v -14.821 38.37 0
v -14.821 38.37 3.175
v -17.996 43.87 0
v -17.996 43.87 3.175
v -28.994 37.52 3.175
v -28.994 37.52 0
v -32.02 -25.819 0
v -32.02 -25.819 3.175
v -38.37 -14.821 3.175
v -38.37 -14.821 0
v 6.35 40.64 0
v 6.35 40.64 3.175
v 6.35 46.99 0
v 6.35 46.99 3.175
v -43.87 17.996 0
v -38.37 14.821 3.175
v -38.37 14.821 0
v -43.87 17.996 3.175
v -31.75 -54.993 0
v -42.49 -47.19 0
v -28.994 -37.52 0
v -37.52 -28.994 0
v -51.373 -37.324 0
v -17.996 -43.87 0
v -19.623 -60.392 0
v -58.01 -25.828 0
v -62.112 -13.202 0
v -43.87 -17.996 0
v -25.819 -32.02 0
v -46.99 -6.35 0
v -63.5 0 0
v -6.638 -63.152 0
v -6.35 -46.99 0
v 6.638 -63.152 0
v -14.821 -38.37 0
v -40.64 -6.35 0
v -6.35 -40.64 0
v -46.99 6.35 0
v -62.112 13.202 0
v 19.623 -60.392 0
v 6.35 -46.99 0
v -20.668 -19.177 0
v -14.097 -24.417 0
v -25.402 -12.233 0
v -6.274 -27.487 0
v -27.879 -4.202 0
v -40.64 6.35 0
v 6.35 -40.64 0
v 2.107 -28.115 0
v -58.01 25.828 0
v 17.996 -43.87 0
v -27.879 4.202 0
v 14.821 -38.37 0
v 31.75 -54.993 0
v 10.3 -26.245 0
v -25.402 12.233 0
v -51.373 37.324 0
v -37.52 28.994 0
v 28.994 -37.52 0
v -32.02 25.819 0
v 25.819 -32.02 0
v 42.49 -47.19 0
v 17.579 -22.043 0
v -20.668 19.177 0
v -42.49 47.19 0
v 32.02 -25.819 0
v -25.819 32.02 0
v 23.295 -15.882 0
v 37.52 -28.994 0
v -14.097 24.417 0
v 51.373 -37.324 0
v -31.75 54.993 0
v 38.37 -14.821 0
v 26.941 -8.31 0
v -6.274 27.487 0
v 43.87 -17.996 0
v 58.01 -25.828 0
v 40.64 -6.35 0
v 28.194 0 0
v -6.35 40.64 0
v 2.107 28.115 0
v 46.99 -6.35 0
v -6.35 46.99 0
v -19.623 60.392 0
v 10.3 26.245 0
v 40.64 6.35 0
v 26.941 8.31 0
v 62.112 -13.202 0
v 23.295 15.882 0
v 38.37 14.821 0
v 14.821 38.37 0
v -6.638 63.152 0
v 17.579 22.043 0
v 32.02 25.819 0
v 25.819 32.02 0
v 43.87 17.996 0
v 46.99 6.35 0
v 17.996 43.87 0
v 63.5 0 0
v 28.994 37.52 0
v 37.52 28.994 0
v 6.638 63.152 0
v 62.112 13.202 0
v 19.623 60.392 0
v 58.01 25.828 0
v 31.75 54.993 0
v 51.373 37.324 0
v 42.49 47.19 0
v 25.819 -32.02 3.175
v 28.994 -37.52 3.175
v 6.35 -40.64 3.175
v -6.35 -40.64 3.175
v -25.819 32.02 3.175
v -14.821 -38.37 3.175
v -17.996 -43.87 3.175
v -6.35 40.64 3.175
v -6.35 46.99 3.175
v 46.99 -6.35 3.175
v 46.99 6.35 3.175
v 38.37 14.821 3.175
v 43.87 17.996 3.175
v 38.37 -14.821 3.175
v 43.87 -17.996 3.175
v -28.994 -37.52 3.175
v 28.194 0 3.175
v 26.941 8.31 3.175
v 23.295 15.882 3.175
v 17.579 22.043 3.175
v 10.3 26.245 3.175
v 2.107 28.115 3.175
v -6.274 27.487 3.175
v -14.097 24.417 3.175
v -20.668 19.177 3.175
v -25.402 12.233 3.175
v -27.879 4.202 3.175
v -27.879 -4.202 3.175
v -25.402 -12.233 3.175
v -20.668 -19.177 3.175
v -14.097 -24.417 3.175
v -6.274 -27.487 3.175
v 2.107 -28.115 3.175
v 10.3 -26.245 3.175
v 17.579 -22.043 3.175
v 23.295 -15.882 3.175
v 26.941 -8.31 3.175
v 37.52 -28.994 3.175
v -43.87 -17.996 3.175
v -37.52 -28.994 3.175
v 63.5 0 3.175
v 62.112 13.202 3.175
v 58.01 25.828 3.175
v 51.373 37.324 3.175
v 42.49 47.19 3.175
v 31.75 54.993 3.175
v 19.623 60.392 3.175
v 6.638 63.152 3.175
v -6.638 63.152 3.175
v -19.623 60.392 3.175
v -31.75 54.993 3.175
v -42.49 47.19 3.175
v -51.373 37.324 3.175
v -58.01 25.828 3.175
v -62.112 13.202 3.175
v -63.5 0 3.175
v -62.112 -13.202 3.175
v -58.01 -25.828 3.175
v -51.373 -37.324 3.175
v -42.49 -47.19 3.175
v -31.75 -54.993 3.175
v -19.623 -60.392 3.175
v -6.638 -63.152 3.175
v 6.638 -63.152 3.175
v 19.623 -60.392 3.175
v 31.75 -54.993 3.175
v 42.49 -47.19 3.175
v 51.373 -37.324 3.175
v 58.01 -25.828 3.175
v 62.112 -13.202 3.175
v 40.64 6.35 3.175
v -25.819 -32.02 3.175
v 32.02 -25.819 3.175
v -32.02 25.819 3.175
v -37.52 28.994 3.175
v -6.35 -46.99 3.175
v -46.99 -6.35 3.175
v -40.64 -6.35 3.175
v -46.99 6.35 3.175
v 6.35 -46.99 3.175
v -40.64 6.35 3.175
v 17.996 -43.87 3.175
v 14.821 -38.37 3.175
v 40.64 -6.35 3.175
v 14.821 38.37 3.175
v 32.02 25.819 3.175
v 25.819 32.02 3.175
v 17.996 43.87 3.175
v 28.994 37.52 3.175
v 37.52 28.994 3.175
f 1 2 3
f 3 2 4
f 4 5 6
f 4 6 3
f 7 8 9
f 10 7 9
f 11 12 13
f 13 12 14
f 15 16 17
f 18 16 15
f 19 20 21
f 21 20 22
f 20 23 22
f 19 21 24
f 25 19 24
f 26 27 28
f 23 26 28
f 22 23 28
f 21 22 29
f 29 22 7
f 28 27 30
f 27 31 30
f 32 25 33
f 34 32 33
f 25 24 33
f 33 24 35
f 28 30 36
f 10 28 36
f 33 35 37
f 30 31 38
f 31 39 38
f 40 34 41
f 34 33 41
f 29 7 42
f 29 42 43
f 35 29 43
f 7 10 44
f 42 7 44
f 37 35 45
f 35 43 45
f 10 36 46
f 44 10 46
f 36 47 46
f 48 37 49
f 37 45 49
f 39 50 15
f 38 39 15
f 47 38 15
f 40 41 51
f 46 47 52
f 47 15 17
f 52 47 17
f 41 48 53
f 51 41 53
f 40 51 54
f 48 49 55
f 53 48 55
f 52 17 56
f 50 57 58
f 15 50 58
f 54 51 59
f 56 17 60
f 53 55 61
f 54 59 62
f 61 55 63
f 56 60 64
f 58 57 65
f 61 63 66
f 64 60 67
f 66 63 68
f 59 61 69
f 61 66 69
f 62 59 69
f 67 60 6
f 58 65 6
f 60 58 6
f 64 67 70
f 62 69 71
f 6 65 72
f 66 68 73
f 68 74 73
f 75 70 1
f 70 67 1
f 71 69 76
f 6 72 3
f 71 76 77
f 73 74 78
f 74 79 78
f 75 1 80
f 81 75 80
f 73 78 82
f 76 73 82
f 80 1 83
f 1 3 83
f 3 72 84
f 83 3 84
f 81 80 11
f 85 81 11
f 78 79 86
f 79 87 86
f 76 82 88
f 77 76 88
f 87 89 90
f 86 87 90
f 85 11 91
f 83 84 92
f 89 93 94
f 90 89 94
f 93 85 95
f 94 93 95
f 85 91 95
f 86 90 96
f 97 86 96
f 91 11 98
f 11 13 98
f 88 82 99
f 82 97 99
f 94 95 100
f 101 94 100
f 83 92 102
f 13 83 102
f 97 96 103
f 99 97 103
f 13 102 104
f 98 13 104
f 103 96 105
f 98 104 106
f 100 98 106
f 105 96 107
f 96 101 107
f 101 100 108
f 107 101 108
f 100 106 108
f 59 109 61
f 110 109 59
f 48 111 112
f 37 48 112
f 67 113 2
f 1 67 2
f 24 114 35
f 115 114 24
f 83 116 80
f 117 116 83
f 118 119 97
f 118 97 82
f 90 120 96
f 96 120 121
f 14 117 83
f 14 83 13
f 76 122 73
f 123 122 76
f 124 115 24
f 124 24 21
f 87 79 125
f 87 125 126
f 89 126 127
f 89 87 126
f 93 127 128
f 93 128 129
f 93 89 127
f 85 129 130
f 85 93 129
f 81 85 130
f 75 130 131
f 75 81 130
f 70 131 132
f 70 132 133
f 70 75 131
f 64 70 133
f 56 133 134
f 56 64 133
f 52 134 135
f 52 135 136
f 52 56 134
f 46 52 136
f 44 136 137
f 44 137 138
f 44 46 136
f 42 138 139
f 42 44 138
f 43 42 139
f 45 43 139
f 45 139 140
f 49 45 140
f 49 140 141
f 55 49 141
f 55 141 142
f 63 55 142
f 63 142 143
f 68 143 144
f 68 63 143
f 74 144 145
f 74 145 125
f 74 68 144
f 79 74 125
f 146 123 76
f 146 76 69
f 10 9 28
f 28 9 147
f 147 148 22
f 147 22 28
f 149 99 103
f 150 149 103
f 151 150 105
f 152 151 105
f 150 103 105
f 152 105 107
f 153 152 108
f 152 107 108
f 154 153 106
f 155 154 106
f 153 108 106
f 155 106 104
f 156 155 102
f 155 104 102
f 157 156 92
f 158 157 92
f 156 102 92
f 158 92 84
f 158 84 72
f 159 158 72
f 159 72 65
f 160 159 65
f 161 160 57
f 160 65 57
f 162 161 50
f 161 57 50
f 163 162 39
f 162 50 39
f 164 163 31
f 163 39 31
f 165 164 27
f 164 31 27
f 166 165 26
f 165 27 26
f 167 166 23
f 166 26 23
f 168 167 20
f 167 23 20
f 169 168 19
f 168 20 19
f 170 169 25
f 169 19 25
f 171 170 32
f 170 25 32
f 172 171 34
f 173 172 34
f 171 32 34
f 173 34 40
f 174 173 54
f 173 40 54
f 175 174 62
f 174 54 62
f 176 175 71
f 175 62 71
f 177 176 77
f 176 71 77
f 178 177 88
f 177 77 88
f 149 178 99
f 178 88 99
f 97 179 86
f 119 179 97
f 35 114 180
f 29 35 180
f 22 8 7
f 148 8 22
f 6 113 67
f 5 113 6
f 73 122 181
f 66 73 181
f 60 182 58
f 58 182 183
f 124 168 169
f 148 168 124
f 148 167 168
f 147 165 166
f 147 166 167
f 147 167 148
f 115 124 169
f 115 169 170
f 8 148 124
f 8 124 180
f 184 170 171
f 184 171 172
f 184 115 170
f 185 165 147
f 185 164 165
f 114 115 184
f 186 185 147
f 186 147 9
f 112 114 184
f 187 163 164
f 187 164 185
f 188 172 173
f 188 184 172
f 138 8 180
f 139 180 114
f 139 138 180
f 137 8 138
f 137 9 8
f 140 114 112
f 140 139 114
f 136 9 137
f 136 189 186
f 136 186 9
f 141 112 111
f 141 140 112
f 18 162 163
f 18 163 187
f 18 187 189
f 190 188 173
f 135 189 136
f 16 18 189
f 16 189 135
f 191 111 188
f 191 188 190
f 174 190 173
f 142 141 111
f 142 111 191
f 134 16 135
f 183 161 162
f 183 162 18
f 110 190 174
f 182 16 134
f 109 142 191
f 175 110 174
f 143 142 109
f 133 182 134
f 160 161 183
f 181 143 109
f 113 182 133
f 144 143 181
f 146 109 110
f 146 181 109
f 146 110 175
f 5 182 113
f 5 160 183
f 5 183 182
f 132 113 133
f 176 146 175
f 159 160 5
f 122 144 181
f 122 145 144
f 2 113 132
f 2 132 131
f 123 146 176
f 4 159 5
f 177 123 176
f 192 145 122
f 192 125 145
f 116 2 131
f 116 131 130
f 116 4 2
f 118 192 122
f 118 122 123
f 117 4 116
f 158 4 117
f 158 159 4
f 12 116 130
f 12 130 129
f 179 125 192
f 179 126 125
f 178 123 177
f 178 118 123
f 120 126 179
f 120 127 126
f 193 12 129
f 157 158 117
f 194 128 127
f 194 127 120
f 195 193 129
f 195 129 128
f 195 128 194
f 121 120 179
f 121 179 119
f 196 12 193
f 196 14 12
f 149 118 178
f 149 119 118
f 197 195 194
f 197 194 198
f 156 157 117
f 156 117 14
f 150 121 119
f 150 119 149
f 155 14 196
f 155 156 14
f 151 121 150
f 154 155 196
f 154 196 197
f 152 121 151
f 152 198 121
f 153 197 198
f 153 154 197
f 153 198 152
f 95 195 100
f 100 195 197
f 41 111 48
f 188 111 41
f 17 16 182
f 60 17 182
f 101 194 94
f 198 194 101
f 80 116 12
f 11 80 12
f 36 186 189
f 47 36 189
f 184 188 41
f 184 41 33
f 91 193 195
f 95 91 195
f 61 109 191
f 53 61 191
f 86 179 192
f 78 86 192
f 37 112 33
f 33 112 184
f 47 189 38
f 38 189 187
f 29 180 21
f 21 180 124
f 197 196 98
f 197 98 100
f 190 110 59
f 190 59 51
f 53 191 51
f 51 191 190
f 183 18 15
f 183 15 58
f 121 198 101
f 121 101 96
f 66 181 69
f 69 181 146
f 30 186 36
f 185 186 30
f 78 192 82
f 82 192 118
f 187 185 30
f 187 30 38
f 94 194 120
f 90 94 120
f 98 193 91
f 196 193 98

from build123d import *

# Parameters (mm, degrees)
F0_R            = 63.5
F0_R_2          = 28.194
F1_DEPTH        = 3.175
F2_W            = 12.7
F2_H            = 6.35
F3_DEPTH        = 3.176
F3_COPIES_COUNT = 12


# Not quite as in the source:
# - a pattern or mirror of a feature is missing from the dataset's text; its kind, count and spacing are read off the source's solid


with BuildPart() as f1:
    # F0 (on Top) → F1 (new body)
    with BuildSketch(Plane.XY):
        Circle(F0_R)
        Circle(F0_R_2, mode=Mode.SUBTRACT)
    extrude(amount=F1_DEPTH)

    # F2 (on face) → F3 (cut, through all)
    with BuildSketch(Plane.XY.offset(3.175)):
        with Locations((0, 43.815)):
            Rectangle(F2_W, F2_H)
    f3 = extrude(amount=-F3_DEPTH, mode=Mode.SUBTRACT)

    # F3_copies: F3 ×12 about axis
    f3_copies_axis = Axis((0, 0, 0), (0, 0, 1))
    for i in range(1, F3_COPIES_COUNT):
        add(f3.rotate(f3_copies_axis, i * 360 / F3_COPIES_COUNT), mode=Mode.SUBTRACT)


solid = f1.part
